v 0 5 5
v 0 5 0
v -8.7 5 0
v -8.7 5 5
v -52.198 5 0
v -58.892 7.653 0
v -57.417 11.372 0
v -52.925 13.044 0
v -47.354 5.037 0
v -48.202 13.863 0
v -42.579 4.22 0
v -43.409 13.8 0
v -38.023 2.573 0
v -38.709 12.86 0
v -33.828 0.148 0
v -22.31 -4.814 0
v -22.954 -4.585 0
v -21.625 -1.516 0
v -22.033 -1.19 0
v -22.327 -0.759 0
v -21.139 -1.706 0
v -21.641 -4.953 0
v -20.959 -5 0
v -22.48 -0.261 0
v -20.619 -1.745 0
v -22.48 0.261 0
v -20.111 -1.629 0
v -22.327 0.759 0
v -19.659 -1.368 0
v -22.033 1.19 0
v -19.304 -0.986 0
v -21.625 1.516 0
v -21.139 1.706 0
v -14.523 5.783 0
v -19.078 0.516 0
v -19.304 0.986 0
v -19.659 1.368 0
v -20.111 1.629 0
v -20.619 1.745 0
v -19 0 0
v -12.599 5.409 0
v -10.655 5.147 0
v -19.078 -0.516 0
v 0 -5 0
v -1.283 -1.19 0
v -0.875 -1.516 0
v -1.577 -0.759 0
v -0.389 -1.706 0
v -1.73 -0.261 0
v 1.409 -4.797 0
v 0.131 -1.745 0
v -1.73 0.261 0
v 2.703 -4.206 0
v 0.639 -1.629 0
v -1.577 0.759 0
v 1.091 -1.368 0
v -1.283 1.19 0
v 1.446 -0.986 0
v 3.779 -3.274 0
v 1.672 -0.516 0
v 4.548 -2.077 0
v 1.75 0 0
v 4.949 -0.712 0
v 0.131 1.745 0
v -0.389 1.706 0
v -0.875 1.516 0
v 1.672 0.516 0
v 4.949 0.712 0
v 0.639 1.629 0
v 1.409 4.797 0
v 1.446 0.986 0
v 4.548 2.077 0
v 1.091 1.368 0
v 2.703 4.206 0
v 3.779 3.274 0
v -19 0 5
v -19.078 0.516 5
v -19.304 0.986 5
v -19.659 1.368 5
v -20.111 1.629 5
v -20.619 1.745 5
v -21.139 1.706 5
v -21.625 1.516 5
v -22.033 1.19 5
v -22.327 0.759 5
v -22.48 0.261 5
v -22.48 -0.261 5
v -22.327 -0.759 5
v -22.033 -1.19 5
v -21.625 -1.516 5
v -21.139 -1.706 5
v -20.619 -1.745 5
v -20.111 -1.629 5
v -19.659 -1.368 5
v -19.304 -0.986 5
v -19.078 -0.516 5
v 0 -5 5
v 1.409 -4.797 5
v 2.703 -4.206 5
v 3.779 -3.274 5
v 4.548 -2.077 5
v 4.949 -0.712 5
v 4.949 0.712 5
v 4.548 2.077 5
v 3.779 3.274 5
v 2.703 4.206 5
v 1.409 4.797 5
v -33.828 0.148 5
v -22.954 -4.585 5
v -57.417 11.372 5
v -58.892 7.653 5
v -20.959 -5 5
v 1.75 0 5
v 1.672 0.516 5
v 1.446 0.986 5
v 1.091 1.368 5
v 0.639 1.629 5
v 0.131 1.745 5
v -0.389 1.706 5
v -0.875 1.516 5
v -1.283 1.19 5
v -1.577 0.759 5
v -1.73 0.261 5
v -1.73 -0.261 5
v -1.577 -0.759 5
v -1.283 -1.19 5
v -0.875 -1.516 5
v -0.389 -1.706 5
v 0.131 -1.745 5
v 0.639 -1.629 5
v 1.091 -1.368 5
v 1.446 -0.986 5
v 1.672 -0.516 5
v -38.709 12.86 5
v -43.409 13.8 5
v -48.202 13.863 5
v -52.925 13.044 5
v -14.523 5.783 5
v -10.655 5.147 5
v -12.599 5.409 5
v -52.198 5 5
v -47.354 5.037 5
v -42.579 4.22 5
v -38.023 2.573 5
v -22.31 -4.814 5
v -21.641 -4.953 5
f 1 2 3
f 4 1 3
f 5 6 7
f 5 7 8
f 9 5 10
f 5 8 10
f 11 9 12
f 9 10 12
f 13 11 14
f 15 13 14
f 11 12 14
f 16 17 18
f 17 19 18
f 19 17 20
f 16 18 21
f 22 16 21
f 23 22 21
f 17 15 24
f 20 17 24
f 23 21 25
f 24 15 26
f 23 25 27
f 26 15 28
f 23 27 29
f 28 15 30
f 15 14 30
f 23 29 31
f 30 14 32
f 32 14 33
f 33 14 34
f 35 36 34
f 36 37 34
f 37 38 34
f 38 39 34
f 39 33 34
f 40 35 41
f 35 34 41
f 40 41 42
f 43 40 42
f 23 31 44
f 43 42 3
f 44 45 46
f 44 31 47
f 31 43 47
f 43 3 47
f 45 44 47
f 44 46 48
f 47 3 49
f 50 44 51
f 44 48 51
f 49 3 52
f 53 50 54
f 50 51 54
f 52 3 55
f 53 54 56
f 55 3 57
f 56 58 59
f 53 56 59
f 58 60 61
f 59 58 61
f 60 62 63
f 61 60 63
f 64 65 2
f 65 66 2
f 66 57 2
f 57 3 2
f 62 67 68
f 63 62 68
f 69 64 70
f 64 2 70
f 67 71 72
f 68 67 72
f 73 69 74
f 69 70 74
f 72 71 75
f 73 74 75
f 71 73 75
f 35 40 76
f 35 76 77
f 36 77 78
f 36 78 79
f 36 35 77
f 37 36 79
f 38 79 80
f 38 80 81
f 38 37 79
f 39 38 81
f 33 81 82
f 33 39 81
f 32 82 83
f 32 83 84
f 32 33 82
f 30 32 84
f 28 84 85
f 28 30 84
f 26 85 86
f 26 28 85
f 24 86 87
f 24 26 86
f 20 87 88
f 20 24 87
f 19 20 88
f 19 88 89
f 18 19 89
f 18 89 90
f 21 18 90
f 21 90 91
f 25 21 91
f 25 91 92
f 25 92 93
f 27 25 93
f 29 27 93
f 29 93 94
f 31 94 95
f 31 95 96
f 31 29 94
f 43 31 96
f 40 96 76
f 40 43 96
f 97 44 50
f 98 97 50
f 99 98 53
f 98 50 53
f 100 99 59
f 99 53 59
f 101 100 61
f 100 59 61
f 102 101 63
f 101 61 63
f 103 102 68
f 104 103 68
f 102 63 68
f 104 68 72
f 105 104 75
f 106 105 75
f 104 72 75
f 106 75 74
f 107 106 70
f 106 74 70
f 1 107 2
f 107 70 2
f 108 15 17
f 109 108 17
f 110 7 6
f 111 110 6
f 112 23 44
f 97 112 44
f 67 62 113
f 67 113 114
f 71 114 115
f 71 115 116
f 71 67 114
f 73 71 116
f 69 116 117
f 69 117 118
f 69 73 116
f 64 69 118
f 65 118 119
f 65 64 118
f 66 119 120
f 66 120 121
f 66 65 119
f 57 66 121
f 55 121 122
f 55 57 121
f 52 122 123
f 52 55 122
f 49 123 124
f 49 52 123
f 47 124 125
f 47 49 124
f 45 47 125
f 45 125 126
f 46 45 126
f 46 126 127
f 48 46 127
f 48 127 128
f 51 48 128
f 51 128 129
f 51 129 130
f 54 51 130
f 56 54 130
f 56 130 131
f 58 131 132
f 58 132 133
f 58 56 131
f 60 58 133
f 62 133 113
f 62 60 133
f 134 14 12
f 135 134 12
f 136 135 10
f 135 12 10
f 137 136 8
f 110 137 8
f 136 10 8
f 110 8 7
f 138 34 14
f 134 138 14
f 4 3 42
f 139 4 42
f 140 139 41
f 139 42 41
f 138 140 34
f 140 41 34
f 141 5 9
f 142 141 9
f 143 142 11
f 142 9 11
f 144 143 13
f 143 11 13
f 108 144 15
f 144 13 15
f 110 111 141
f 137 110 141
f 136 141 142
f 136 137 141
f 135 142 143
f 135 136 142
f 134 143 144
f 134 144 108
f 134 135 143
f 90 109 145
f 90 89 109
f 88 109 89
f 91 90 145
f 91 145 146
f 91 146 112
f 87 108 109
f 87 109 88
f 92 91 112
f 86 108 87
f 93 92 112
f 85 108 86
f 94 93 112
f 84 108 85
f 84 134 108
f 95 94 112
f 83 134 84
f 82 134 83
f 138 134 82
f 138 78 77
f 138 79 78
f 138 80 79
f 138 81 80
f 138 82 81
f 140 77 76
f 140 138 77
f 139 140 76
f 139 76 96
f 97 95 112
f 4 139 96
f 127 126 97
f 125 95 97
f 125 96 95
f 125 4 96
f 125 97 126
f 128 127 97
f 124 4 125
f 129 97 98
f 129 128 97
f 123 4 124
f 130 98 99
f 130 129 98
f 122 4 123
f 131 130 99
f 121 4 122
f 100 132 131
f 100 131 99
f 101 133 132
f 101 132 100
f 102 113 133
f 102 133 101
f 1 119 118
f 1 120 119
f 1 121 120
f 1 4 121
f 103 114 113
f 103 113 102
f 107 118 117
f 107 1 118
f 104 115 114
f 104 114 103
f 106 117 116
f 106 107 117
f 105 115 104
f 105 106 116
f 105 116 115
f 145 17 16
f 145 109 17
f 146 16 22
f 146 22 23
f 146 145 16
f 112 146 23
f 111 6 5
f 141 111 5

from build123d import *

# Parameters (mm, degrees)
SKETCH2_R           = 1.749985299
SKETCH2_R_2         = 1.75
BOSS_EXTRUDE1_DEPTH = 5
FILLET1_R           = 5


with BuildPart() as part:
    # Sketch2 → Boss-Extrude1 (new body)
    with BuildSketch(Plane.XY):
        with BuildLine():
            Line((-33.828383846, 0.147779708), (-21.999999142, -4.999968857))
            Line((-21.999999142, -4.999968857), (0, -4.999968857))
            ThreePointArc((0, -4.999968857), (4.999968857, 0), (0, 4.999968857))
            Line((0, 4.999968857), (-8.7, 4.999968857))
            ThreePointArc((-8.7, 4.999968857), (-11.628806388, 5.263812443), (-14.523326425, 5.782728669))
            Line((-14.523326425, 5.782728669), (-38.709257265, 12.859504023))
            ThreePointArc((-38.709257265, 12.859504023), (-48.20223144, 13.862553465), (-57.417402301, 11.371912412))
            Line((-57.417402301, 11.371912412), (-58.891567994, 7.653467104))
            Line((-58.891567994, 7.653467104), (-52.198366439, 4.999968857))
            ThreePointArc((-52.198366439, 4.999968857), (-42.578635596, 4.219761872), (-33.828383846, 0.147779708))
        make_face()
        Circle(SKETCH2_R, mode=Mode.SUBTRACT)
        with Locations((-20.75, 0)):
            Circle(SKETCH2_R_2, mode=Mode.SUBTRACT)
    extrude(amount=BOSS_EXTRUDE1_DEPTH)

    # Fillet1
    fillet1_edges = [part.edges().sort_by_distance(p)[0] for p in [
        (-21.999999142, -4.999968857, 2.5),
    ]]
    fillet(fillet1_edges, radius=FILLET1_R)


solid = part.part
